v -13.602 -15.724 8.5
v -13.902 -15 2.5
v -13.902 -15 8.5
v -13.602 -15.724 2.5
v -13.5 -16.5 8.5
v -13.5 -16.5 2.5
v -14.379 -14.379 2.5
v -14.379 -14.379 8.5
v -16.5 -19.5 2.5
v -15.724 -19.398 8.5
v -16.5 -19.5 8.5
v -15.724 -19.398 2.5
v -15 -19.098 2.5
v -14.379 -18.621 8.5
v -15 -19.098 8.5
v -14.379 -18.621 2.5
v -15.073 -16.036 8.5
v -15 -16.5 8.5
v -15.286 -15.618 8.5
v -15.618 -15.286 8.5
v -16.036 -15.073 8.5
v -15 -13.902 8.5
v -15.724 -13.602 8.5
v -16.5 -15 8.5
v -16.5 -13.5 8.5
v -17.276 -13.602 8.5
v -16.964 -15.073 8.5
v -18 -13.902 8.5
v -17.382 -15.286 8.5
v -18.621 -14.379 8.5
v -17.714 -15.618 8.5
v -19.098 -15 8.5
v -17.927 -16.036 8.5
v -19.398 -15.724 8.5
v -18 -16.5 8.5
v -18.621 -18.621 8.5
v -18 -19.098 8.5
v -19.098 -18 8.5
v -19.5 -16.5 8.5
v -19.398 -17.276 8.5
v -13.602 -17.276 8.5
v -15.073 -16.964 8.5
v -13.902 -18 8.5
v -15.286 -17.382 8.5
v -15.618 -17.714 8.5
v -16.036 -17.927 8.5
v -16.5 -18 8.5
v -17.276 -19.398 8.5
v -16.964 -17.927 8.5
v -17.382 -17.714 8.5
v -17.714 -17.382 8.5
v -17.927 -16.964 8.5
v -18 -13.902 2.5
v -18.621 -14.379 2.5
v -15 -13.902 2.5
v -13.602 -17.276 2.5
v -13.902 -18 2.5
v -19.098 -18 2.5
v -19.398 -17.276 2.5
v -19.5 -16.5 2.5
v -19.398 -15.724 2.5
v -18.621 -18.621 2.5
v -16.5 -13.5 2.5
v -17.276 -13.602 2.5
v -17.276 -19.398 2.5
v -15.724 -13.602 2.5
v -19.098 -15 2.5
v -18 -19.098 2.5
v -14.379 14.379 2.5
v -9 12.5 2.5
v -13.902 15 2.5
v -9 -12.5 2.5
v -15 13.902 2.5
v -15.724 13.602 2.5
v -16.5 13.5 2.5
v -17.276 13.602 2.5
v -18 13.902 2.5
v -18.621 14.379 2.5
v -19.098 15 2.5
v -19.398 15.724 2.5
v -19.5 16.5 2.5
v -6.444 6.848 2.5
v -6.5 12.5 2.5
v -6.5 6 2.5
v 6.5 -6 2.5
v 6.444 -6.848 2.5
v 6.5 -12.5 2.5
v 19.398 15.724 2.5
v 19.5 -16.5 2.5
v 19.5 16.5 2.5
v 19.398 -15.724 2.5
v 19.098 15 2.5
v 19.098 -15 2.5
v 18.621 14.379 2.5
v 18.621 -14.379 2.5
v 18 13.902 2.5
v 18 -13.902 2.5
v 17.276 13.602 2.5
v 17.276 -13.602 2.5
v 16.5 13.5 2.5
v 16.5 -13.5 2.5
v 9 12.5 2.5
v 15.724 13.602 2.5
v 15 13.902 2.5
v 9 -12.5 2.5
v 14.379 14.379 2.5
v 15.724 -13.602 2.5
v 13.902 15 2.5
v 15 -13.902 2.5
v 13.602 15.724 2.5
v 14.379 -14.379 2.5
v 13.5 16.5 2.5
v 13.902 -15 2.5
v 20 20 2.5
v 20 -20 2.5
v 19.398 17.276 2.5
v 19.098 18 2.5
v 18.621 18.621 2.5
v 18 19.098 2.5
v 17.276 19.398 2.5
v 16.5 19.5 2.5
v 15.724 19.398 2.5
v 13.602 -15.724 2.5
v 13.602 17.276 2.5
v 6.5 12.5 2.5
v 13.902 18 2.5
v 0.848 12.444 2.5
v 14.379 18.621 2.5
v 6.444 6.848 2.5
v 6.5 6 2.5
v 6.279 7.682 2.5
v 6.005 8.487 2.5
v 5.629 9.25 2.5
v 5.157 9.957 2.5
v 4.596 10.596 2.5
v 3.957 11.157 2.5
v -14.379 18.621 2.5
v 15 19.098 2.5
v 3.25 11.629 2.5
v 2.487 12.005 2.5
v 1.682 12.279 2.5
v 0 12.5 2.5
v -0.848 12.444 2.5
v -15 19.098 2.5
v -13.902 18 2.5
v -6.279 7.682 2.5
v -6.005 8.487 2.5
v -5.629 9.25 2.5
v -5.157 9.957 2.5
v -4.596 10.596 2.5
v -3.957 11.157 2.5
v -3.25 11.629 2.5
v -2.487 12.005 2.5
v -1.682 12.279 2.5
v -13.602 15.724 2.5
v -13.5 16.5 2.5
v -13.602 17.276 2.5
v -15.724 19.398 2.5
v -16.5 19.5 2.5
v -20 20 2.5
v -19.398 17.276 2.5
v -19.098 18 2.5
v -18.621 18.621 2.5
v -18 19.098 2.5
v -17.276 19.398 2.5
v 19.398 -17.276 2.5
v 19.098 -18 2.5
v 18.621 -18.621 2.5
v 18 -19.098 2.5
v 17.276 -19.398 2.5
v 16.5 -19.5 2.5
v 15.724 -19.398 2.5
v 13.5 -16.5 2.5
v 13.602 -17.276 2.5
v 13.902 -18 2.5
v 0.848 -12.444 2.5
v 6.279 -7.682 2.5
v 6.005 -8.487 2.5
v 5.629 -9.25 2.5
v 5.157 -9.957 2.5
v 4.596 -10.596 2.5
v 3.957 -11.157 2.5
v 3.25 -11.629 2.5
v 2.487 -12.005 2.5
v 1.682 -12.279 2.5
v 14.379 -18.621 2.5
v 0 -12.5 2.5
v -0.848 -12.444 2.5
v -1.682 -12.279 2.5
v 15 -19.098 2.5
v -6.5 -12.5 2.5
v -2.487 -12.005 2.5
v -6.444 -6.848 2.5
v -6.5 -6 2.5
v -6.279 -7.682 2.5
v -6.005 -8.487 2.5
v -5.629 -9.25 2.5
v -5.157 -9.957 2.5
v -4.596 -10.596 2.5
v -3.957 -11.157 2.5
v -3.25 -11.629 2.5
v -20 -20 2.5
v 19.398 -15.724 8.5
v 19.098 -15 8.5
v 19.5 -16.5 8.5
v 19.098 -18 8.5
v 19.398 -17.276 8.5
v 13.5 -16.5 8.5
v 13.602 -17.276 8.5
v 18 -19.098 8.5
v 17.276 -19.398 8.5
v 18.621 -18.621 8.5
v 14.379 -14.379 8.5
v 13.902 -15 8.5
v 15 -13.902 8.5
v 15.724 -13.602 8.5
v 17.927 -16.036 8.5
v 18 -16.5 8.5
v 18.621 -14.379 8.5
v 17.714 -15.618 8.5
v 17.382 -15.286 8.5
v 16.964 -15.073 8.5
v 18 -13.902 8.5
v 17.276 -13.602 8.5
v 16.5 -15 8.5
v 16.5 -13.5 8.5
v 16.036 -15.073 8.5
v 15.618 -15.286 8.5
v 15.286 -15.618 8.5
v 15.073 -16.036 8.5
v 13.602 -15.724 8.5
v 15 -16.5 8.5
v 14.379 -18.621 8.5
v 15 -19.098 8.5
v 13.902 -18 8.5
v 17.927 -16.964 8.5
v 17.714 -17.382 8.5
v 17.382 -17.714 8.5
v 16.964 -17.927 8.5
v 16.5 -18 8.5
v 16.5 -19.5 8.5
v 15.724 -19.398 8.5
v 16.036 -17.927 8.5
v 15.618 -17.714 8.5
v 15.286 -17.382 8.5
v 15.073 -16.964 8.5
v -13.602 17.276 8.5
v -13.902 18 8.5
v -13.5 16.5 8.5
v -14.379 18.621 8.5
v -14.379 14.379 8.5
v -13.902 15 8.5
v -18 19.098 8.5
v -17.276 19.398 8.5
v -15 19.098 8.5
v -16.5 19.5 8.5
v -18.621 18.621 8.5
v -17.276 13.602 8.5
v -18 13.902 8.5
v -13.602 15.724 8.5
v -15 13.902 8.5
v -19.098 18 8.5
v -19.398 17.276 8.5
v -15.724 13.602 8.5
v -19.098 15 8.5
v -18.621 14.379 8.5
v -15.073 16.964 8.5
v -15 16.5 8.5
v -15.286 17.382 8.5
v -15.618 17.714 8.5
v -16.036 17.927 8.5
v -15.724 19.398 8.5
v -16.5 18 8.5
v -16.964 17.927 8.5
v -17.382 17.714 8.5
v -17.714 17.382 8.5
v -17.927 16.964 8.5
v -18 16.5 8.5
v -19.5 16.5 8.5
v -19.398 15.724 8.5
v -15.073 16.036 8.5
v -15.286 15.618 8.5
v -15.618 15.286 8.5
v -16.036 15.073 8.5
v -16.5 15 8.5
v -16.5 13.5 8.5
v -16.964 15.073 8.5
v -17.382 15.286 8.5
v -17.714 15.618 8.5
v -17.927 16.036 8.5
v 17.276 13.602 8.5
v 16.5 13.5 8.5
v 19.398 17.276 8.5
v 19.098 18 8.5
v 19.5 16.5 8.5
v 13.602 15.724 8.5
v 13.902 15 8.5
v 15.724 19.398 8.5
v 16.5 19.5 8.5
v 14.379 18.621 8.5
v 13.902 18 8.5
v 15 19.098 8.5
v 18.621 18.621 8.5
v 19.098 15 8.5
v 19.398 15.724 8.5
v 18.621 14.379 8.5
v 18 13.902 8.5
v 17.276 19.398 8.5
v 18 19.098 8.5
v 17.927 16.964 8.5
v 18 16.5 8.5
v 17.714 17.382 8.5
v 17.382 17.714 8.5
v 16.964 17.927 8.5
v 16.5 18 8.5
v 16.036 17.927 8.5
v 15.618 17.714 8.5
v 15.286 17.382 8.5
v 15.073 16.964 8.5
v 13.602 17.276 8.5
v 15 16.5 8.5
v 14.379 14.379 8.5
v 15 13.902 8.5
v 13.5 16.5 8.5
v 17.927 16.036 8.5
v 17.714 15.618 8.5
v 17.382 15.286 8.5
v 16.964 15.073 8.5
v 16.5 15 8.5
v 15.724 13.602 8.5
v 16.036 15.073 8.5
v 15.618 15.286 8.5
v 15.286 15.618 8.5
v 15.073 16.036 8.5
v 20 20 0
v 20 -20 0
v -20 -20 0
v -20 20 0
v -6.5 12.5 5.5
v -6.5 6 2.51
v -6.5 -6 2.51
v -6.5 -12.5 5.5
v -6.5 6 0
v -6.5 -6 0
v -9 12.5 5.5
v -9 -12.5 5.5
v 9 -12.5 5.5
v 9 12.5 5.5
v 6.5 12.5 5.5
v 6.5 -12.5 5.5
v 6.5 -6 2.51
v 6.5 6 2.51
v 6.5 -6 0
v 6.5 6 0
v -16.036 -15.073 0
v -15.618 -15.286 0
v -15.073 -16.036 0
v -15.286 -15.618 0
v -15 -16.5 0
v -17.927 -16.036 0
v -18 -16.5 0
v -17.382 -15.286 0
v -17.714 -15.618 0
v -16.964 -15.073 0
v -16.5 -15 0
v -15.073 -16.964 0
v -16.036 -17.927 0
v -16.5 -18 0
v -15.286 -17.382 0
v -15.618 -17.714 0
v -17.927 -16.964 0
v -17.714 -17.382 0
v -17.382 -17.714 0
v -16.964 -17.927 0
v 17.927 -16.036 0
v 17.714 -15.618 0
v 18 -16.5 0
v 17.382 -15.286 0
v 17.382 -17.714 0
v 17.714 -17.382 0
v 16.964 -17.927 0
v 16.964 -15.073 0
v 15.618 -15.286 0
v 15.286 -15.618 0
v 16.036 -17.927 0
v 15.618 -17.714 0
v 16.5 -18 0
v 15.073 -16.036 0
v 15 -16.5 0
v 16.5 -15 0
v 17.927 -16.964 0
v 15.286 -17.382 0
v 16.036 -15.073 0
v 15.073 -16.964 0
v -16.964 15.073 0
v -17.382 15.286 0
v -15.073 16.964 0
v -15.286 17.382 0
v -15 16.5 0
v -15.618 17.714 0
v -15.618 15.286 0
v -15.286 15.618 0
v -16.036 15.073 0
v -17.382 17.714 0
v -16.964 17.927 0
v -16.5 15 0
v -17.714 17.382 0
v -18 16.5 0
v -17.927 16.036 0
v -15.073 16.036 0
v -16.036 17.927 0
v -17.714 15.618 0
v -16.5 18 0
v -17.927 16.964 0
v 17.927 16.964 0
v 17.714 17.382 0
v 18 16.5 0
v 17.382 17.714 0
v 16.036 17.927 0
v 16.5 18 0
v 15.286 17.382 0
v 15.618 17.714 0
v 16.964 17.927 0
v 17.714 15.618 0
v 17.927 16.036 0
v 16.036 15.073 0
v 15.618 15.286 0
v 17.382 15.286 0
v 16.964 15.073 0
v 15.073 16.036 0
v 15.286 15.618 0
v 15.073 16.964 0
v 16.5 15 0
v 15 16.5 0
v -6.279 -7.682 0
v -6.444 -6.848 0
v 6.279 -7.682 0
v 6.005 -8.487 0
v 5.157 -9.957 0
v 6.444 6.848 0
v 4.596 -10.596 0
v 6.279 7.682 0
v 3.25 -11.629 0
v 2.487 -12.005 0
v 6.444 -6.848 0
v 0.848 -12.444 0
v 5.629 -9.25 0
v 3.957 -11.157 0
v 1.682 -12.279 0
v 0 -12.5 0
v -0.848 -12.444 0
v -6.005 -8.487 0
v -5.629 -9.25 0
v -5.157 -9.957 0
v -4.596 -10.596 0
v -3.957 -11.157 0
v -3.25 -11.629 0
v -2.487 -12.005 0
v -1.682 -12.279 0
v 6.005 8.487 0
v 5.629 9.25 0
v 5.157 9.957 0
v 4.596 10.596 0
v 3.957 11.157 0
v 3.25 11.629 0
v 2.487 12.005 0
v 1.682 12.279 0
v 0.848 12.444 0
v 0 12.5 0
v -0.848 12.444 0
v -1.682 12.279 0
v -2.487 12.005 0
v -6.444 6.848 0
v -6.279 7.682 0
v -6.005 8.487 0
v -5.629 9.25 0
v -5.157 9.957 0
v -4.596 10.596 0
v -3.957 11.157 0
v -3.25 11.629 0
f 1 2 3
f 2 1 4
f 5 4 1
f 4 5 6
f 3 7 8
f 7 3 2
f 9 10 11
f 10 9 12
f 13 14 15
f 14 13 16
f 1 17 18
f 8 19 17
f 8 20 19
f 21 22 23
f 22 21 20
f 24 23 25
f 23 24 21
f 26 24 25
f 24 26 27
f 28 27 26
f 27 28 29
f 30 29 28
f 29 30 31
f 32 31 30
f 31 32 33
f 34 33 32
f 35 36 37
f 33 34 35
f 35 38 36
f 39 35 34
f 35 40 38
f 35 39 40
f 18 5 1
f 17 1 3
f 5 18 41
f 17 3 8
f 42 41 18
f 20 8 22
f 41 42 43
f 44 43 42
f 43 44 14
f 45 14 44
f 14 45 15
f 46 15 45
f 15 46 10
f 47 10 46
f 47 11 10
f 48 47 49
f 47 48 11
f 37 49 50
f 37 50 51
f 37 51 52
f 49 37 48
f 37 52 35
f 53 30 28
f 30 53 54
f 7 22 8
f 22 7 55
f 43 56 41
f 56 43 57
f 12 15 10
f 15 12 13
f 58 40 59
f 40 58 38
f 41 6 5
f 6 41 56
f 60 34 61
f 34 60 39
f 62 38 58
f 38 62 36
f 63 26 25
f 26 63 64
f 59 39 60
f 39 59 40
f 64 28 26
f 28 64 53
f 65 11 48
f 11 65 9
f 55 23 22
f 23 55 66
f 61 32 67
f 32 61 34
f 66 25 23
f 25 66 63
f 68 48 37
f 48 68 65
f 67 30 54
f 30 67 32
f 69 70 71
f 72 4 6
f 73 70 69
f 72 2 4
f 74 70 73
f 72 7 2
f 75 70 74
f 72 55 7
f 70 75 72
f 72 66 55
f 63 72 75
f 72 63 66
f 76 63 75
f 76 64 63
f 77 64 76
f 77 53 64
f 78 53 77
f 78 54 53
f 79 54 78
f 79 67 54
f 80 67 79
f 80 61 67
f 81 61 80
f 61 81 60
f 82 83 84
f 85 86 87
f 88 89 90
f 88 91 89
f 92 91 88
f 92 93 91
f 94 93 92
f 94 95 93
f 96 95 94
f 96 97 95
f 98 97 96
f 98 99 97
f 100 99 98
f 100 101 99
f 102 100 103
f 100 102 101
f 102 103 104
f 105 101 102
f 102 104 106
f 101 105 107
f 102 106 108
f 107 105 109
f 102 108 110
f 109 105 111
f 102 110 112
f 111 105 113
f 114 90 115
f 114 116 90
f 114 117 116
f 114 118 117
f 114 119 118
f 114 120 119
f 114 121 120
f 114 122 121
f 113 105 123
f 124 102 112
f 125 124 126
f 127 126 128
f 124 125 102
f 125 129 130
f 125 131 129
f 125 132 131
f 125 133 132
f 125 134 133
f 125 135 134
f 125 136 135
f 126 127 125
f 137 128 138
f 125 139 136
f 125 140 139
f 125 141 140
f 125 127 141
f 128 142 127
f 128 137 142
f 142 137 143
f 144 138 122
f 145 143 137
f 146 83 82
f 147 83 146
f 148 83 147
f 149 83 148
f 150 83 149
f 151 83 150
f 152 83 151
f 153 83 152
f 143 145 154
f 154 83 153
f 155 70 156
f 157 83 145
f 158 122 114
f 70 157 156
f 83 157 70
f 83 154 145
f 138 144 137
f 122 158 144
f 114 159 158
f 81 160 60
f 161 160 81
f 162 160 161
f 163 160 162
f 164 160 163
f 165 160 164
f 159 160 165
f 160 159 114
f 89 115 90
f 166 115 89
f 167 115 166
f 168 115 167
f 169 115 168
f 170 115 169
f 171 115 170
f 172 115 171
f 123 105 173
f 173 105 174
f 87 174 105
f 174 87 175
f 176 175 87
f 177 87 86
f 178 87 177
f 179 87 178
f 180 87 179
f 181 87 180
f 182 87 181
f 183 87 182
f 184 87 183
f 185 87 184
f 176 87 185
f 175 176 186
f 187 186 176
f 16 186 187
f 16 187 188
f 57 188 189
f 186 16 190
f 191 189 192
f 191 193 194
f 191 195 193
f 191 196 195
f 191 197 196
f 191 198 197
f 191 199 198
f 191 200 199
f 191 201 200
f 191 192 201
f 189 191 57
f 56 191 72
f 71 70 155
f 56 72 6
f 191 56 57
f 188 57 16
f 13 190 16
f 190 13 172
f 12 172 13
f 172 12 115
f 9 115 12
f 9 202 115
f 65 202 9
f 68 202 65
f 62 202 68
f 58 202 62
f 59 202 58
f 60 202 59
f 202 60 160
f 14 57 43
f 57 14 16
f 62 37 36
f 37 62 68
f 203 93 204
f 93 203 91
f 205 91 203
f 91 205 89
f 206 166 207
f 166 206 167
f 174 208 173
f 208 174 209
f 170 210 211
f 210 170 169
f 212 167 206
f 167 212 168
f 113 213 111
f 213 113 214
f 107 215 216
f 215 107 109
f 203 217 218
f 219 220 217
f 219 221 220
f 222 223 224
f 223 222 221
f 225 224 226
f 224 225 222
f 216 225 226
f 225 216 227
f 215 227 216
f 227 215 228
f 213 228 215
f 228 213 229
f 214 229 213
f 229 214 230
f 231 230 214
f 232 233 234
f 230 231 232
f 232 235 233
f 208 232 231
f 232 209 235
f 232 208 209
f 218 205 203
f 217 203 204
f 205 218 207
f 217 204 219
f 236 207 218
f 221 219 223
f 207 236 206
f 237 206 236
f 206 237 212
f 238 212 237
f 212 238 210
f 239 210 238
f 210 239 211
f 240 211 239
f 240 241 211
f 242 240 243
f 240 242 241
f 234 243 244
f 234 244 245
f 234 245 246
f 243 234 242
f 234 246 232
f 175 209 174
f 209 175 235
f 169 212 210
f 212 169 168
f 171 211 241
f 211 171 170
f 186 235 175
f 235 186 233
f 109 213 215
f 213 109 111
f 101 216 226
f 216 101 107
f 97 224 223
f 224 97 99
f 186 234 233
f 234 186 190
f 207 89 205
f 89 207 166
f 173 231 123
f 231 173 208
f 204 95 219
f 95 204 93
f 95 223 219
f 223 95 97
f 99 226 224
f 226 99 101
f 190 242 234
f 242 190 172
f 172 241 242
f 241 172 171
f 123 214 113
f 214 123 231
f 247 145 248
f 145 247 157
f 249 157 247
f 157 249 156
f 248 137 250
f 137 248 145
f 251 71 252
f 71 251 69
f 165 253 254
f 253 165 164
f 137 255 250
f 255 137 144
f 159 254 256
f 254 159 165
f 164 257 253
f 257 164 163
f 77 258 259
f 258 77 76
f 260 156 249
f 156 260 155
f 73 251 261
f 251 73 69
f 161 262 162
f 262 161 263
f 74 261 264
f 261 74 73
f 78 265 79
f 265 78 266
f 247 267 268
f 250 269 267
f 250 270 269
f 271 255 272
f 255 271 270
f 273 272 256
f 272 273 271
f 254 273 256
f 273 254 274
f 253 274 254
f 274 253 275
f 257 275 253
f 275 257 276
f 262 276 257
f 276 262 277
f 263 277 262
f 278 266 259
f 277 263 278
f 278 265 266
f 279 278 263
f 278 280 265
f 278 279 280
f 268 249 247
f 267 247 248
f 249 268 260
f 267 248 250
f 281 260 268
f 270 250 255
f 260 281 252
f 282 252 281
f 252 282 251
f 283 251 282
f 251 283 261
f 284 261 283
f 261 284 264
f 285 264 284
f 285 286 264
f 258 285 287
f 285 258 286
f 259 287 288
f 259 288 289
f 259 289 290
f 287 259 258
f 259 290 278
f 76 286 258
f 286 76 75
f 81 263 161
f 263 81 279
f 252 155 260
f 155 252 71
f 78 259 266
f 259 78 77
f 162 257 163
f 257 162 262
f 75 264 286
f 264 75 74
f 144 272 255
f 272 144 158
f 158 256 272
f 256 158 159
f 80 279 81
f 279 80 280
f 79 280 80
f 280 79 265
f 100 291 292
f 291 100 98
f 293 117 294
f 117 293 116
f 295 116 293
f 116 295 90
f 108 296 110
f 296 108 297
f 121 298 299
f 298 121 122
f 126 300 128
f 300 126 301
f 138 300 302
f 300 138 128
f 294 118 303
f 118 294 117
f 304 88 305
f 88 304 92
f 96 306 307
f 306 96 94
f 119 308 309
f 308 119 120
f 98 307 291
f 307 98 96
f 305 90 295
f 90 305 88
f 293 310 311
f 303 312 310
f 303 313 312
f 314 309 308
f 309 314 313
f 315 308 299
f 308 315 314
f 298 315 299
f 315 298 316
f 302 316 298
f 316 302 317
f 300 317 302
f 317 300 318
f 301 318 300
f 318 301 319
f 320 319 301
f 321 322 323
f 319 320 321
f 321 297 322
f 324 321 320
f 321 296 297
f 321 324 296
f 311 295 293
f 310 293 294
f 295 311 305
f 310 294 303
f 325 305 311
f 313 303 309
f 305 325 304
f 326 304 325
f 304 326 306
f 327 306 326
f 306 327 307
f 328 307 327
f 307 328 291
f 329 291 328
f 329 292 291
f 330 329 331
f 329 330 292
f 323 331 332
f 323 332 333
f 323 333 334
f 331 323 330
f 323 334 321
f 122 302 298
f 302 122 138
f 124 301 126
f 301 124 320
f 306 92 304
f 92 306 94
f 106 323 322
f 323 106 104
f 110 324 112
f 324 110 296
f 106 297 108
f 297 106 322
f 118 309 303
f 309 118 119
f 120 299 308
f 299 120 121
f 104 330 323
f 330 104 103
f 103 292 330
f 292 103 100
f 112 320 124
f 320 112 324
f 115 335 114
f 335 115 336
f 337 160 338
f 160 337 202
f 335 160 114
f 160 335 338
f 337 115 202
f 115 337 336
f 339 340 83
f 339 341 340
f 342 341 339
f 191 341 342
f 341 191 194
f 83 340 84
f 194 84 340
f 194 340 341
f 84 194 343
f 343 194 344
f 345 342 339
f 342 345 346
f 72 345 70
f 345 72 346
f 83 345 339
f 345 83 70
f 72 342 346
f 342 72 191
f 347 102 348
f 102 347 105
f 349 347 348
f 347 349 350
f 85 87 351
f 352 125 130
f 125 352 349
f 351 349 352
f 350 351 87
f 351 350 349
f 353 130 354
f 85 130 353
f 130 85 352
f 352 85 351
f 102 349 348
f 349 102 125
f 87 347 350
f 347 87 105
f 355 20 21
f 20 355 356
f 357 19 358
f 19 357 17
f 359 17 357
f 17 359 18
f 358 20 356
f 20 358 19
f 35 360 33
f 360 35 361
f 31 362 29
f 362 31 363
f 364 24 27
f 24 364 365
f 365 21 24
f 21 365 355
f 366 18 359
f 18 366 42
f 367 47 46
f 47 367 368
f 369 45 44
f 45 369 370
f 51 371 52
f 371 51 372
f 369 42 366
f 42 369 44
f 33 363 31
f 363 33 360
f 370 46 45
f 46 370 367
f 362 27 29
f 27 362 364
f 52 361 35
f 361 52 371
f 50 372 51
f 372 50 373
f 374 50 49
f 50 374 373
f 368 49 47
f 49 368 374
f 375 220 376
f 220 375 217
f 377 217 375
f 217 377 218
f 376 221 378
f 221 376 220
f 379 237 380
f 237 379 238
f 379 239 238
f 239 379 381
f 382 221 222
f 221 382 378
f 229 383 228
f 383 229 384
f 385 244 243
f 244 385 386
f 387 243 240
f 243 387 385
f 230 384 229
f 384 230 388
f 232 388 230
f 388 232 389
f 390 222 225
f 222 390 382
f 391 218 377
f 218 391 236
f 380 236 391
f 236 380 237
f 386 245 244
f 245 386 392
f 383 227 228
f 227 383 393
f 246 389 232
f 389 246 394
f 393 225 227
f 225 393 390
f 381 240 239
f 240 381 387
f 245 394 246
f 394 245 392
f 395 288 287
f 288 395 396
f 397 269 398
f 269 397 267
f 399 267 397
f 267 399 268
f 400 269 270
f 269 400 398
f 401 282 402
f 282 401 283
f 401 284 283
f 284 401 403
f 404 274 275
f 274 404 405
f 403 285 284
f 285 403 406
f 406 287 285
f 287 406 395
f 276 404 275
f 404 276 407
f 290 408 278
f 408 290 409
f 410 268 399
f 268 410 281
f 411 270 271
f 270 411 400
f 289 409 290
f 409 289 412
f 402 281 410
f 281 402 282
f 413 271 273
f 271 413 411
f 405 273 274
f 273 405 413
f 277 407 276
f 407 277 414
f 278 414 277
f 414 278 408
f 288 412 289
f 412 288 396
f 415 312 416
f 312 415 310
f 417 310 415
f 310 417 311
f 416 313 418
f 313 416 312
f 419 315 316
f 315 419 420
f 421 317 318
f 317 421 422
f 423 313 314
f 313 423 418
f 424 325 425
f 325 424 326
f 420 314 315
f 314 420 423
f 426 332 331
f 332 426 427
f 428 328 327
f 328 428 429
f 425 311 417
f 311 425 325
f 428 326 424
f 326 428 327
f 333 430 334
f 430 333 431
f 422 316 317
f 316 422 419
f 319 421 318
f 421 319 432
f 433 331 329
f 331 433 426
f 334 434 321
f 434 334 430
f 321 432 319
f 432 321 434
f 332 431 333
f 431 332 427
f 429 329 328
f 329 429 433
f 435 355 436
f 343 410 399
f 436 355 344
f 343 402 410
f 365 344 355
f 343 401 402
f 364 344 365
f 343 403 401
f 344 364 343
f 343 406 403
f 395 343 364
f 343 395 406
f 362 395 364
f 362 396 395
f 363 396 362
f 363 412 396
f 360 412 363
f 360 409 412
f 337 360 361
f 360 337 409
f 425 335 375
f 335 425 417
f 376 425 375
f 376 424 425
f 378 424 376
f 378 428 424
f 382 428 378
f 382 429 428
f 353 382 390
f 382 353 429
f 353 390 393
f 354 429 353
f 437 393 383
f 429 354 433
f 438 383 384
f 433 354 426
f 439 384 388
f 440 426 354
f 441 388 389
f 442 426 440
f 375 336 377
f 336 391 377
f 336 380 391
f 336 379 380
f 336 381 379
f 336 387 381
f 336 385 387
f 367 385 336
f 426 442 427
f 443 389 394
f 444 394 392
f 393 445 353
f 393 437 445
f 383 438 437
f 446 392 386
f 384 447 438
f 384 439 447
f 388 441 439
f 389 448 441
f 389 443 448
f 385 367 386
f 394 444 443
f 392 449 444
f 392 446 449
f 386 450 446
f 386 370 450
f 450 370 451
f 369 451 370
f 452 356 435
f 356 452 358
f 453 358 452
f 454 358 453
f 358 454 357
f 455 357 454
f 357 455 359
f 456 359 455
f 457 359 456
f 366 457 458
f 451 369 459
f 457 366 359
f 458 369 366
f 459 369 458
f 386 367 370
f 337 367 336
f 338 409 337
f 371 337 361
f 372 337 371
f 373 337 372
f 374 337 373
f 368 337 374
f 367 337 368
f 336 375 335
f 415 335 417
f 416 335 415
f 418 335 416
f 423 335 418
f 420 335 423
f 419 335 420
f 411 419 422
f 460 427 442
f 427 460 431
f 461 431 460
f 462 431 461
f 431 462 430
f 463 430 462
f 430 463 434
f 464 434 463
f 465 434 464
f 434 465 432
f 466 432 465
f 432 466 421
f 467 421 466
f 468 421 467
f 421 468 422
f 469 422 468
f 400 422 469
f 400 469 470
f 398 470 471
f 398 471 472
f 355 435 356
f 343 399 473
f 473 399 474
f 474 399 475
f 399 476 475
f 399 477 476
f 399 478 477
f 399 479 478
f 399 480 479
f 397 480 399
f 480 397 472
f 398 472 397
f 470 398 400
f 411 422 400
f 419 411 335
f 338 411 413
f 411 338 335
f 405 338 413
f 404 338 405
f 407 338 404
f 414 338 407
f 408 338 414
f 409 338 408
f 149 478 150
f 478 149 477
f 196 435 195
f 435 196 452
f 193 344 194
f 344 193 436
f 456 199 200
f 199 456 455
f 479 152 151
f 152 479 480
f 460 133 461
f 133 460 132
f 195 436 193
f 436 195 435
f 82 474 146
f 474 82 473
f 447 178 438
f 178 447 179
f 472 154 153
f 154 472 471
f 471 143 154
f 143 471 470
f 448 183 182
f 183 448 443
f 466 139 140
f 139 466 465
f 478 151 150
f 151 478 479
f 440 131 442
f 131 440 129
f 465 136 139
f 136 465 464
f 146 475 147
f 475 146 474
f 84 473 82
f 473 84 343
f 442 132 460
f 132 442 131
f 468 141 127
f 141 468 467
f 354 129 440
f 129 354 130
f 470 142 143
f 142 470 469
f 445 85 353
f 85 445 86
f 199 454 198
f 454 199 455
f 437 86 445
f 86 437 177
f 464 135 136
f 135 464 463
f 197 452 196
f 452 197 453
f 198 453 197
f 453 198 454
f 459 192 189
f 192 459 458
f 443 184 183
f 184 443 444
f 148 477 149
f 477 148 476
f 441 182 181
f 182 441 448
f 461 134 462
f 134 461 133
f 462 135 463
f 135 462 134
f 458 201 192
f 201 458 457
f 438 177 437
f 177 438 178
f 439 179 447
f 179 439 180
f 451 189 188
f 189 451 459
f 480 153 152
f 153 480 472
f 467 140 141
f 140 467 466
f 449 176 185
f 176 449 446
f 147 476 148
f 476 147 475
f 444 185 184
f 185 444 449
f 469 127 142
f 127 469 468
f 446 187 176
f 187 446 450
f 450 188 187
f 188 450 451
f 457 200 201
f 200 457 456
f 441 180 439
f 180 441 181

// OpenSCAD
// Joystick Axis Restrictor — Y-Axis Only Gate Plate
// Replaces the stock circular gate plate with a vertical slot,
// restricting joystick movement to Y-axis only (no X travel).
//
// Fits: CHC-40B hall-effect joystick (and similar 40mm gate plates)
// Prints: Bambu Lab A1, 0.4mm nozzle, PLA
// All dimensions in mm.
//
// The stock plate has a 19mm circular opening allowing full 360-degree
// travel. This replacement uses a 13mm-wide vertical slot that blocks
// the X-axis gimbal carriage while allowing full Y-axis travel.
//
// Usage:
//   - Preview:  set PART = "preview"
//   - Export:   set PART = "print", then F6 -> Export STL

// ─── PART SELECTOR ──────────────────────────────────────────────
PART = "preview"; // "print" or "preview"

// ─── PRINT TUNING ───────────────────────────────────────────────
NOZZLE       = 0.4;
LAYER_HEIGHT = 0.2;
TOL          = 0.2;   // fit tolerance for gate-to-housing

// ─── PLATE DIMENSIONS ───────────────────────────────────────────
PLATE_EXT    = 40;    // exterior plate width/height (square)
PLATE_INT    = 38;    // interior width between lips
PLATE_T      = 2.5;   // plate body thickness (matches stock)

// ─── EDGE LIPS ──────────────────────────────────────────────────
// Thin rails on all 4 edges that slide into slots in the controller
// housing bottom. These locate and retain the plate.
LIP_W        = 1;     // lip width (protrudes from plate edge)
LIP_H        = 2.5;   // lip height (extends below plate)

// ─── CORNER POSTS ───────────────────────────────────────────────
// Cylindrical standoffs at each corner for screw attachment.
// Screws pass through from below, thread into controller body above.
POST_H       = 8.5;   // total post height from plate bottom
POST_OD      = 6;     // post outer diameter
// No fillet — 3mm plate provides adequate base support

// ─── SCREW HOLES ────────────────────────────────────────────────
SCREW_CC     = 33;    // center-to-center spacing (square pattern)
SCREW_RECESS_D = 4;   // countersink recess diameter (top of plate)
SCREW_THROUGH_D = 3;  // passthrough hole diameter
SCREW_RECESS_DEPTH = 1.2; // countersink depth from plate top

// ─── RESTRICTOR SLOT ────────────────────────────────────────────
// Vertical slot replaces the stock 19mm circular opening.
// Width sized to match the X-axis gimbal carriage (13mm) so the
// carriage physically cannot move side-to-side.
SLOT_W       = 13;    // slot width (X direction — blocks X travel)
SLOT_L       = 25;    // slot length (Y direction — allows full Y travel)
                      // Sized to clear screw holes with 2mm margin

// Stock reference (not used in geometry, for documentation)
STOCK_HOLE_D = 19;    // original circular gate opening

// ─── REINFORCEMENT RIBS ─────────────────────────────────────────
// Two ribs run parallel to the slot on the top (interior) surface.
// They extend upward into the controller housing, creating a channel
// that physically blocks the gimbal carriage from X-axis travel.
RIB_H        = 3;     // rib height above plate top surface
RIB_W        = 2.5;   // rib width (thickness in X direction)
RIB_L        = 25;    // rib length (matches slot length in Y direction)
RIB_GAP      = SLOT_W; // gap between ribs = slot width (ribs sit at slot edges)

// ─── SPRING CLEARANCE NOTES ─────────────────────────────────────
// Return springs: 17mm wide, extend 4mm from interior body wall.
// When joystick is at full Y deflection, one spring stretches to 16mm.
// Springs are BELOW the plate — no interference with plate geometry.
// If fins are added in a future version, they must avoid the spring zone:
//   Spring zone: 4mm inward from each Y-axis body wall edge.

// ─── COMPUTED VALUES ────────────────────────────────────────────
// Screw positions (centered on plate)
screw_offset = SCREW_CC / 2;
screw_positions = [
    [-screw_offset, -screw_offset],
    [ screw_offset, -screw_offset],
    [-screw_offset,  screw_offset],
    [ screw_offset,  screw_offset]
];

// ─── MODULES ────────────────────────────────────────────────────

// Rounded slot (stadium/oblong shape)
module slot_2d(w, l) {
    // Stadium: rectangle with semicircle caps
    hull() {
        translate([0, -(l/2 - w/2)])
            circle(d=w, $fn=48);
        translate([0,  (l/2 - w/2)])
            circle(d=w, $fn=48);
    }
}

// Main restrictor plate
// Built as a monolithic body to avoid non-manifold T-junctions:
// Full-depth slab from -LIP_H to PLATE_T, then subtract the non-lip interior.
module restrictor_plate() {
    lip_len = PLATE_INT;

    difference() {
        union() {
            // ── MONOLITHIC PLATE + LIP BODY ──
            // Full slab extending from -LIP_H to PLATE_T
            translate([-PLATE_EXT/2, -PLATE_EXT/2, -LIP_H])
                cube([PLATE_EXT, PLATE_EXT, PLATE_T + LIP_H]);

            // ── REINFORCEMENT RIBS ──
            // Two ribs flanking the slot, extending upward from plate top
            // Left rib (negative X side of slot)
            translate([-(RIB_GAP/2 + RIB_W), -RIB_L/2, PLATE_T - 0.01])
                cube([RIB_W, RIB_L, RIB_H + 0.01]);
            // Right rib (positive X side of slot)
            translate([RIB_GAP/2, -RIB_L/2, PLATE_T - 0.01])
                cube([RIB_W, RIB_L, RIB_H + 0.01]);

            // ── CORNER POSTS ──
            // Extend upward from plate top surface
            for (pos = screw_positions) {
                translate([pos[0], pos[1], PLATE_T])
                    cylinder(d=POST_OD, h=POST_H - PLATE_T, $fn=24);
            }
        }

        // ── REMOVE INTERIOR BELOW PLATE (keep only lip rails) ──
        // Cut away the material below Z=0 except where lips are.
        // This leaves 1mm-wide rails on all 4 edges.

        // Interior block below plate: everything inside the lip perimeter
        translate([-(PLATE_EXT/2 - LIP_W), -(PLATE_EXT/2 - LIP_W), -LIP_H - 0.01])
            cube([PLATE_EXT - 2*LIP_W, PLATE_EXT - 2*LIP_W, LIP_H + 0.01]);

        // Also remove the lip-depth material at corners (lips don't extend into corners)
        // Front-left corner
        translate([-PLATE_EXT/2 - 0.01, -PLATE_EXT/2 - 0.01, -LIP_H - 0.01])
            cube([(PLATE_EXT - lip_len)/2 + 0.01, PLATE_EXT + 0.02, LIP_H + 0.01]);
        // Front-right corner
        translate([PLATE_EXT/2 - (PLATE_EXT - lip_len)/2, -PLATE_EXT/2 - 0.01, -LIP_H - 0.01])
            cube([(PLATE_EXT - lip_len)/2 + 0.01, PLATE_EXT + 0.02, LIP_H + 0.01]);
        // Back-left corner (Y axis)
        translate([-PLATE_EXT/2 - 0.01, -PLATE_EXT/2 - 0.01, -LIP_H - 0.01])
            cube([PLATE_EXT + 0.02, (PLATE_EXT - lip_len)/2 + 0.01, LIP_H + 0.01]);
        // Back-right corner (Y axis)
        translate([-PLATE_EXT/2 - 0.01, PLATE_EXT/2 - (PLATE_EXT - lip_len)/2, -LIP_H - 0.01])
            cube([PLATE_EXT + 0.02, (PLATE_EXT - lip_len)/2 + 0.01, LIP_H + 0.01]);

        // ── RESTRICTOR SLOT (through entire plate + lip depth) ──
        translate([0, 0, -LIP_H - 0.01])
            linear_extrude(PLATE_T + LIP_H + 0.02)
                slot_2d(SLOT_W, SLOT_L);

        // ── SCREW HOLES ──
        for (pos = screw_positions) {
            // Through-hole (full height including post)
            translate([pos[0], pos[1], -LIP_H - 0.01])
                cylinder(d=SCREW_THROUGH_D, h=POST_H + LIP_H + 0.02, $fn=20);

            // Countersink recess from bottom (screw head sits flush)
            translate([pos[0], pos[1], -LIP_H - 0.01])
                cylinder(d=SCREW_RECESS_D, h=SCREW_RECESS_DEPTH + 0.01, $fn=20);
        }
    }
}

// ─── PART SELECTION ─────────────────────────────────────────────

if (PART == "print") {
    // Print orientation: plate bottom on bed, posts pointing up
    // Lips will need support or can bridge (only 2.5mm, should bridge fine)
    restrictor_plate();
}
else if (PART == "preview") {
    // Preview with colors and stock hole ghost
    color("SteelBlue") restrictor_plate();

    // Ghost: stock circular opening for comparison
    %translate([0, 0, PLATE_T/2])
        cylinder(d=STOCK_HOLE_D, h=PLATE_T + 0.1, center=true, $fn=48);
}

// ─── RENDER SETTINGS ────────────────────────────────────────────
$fn = 48;
